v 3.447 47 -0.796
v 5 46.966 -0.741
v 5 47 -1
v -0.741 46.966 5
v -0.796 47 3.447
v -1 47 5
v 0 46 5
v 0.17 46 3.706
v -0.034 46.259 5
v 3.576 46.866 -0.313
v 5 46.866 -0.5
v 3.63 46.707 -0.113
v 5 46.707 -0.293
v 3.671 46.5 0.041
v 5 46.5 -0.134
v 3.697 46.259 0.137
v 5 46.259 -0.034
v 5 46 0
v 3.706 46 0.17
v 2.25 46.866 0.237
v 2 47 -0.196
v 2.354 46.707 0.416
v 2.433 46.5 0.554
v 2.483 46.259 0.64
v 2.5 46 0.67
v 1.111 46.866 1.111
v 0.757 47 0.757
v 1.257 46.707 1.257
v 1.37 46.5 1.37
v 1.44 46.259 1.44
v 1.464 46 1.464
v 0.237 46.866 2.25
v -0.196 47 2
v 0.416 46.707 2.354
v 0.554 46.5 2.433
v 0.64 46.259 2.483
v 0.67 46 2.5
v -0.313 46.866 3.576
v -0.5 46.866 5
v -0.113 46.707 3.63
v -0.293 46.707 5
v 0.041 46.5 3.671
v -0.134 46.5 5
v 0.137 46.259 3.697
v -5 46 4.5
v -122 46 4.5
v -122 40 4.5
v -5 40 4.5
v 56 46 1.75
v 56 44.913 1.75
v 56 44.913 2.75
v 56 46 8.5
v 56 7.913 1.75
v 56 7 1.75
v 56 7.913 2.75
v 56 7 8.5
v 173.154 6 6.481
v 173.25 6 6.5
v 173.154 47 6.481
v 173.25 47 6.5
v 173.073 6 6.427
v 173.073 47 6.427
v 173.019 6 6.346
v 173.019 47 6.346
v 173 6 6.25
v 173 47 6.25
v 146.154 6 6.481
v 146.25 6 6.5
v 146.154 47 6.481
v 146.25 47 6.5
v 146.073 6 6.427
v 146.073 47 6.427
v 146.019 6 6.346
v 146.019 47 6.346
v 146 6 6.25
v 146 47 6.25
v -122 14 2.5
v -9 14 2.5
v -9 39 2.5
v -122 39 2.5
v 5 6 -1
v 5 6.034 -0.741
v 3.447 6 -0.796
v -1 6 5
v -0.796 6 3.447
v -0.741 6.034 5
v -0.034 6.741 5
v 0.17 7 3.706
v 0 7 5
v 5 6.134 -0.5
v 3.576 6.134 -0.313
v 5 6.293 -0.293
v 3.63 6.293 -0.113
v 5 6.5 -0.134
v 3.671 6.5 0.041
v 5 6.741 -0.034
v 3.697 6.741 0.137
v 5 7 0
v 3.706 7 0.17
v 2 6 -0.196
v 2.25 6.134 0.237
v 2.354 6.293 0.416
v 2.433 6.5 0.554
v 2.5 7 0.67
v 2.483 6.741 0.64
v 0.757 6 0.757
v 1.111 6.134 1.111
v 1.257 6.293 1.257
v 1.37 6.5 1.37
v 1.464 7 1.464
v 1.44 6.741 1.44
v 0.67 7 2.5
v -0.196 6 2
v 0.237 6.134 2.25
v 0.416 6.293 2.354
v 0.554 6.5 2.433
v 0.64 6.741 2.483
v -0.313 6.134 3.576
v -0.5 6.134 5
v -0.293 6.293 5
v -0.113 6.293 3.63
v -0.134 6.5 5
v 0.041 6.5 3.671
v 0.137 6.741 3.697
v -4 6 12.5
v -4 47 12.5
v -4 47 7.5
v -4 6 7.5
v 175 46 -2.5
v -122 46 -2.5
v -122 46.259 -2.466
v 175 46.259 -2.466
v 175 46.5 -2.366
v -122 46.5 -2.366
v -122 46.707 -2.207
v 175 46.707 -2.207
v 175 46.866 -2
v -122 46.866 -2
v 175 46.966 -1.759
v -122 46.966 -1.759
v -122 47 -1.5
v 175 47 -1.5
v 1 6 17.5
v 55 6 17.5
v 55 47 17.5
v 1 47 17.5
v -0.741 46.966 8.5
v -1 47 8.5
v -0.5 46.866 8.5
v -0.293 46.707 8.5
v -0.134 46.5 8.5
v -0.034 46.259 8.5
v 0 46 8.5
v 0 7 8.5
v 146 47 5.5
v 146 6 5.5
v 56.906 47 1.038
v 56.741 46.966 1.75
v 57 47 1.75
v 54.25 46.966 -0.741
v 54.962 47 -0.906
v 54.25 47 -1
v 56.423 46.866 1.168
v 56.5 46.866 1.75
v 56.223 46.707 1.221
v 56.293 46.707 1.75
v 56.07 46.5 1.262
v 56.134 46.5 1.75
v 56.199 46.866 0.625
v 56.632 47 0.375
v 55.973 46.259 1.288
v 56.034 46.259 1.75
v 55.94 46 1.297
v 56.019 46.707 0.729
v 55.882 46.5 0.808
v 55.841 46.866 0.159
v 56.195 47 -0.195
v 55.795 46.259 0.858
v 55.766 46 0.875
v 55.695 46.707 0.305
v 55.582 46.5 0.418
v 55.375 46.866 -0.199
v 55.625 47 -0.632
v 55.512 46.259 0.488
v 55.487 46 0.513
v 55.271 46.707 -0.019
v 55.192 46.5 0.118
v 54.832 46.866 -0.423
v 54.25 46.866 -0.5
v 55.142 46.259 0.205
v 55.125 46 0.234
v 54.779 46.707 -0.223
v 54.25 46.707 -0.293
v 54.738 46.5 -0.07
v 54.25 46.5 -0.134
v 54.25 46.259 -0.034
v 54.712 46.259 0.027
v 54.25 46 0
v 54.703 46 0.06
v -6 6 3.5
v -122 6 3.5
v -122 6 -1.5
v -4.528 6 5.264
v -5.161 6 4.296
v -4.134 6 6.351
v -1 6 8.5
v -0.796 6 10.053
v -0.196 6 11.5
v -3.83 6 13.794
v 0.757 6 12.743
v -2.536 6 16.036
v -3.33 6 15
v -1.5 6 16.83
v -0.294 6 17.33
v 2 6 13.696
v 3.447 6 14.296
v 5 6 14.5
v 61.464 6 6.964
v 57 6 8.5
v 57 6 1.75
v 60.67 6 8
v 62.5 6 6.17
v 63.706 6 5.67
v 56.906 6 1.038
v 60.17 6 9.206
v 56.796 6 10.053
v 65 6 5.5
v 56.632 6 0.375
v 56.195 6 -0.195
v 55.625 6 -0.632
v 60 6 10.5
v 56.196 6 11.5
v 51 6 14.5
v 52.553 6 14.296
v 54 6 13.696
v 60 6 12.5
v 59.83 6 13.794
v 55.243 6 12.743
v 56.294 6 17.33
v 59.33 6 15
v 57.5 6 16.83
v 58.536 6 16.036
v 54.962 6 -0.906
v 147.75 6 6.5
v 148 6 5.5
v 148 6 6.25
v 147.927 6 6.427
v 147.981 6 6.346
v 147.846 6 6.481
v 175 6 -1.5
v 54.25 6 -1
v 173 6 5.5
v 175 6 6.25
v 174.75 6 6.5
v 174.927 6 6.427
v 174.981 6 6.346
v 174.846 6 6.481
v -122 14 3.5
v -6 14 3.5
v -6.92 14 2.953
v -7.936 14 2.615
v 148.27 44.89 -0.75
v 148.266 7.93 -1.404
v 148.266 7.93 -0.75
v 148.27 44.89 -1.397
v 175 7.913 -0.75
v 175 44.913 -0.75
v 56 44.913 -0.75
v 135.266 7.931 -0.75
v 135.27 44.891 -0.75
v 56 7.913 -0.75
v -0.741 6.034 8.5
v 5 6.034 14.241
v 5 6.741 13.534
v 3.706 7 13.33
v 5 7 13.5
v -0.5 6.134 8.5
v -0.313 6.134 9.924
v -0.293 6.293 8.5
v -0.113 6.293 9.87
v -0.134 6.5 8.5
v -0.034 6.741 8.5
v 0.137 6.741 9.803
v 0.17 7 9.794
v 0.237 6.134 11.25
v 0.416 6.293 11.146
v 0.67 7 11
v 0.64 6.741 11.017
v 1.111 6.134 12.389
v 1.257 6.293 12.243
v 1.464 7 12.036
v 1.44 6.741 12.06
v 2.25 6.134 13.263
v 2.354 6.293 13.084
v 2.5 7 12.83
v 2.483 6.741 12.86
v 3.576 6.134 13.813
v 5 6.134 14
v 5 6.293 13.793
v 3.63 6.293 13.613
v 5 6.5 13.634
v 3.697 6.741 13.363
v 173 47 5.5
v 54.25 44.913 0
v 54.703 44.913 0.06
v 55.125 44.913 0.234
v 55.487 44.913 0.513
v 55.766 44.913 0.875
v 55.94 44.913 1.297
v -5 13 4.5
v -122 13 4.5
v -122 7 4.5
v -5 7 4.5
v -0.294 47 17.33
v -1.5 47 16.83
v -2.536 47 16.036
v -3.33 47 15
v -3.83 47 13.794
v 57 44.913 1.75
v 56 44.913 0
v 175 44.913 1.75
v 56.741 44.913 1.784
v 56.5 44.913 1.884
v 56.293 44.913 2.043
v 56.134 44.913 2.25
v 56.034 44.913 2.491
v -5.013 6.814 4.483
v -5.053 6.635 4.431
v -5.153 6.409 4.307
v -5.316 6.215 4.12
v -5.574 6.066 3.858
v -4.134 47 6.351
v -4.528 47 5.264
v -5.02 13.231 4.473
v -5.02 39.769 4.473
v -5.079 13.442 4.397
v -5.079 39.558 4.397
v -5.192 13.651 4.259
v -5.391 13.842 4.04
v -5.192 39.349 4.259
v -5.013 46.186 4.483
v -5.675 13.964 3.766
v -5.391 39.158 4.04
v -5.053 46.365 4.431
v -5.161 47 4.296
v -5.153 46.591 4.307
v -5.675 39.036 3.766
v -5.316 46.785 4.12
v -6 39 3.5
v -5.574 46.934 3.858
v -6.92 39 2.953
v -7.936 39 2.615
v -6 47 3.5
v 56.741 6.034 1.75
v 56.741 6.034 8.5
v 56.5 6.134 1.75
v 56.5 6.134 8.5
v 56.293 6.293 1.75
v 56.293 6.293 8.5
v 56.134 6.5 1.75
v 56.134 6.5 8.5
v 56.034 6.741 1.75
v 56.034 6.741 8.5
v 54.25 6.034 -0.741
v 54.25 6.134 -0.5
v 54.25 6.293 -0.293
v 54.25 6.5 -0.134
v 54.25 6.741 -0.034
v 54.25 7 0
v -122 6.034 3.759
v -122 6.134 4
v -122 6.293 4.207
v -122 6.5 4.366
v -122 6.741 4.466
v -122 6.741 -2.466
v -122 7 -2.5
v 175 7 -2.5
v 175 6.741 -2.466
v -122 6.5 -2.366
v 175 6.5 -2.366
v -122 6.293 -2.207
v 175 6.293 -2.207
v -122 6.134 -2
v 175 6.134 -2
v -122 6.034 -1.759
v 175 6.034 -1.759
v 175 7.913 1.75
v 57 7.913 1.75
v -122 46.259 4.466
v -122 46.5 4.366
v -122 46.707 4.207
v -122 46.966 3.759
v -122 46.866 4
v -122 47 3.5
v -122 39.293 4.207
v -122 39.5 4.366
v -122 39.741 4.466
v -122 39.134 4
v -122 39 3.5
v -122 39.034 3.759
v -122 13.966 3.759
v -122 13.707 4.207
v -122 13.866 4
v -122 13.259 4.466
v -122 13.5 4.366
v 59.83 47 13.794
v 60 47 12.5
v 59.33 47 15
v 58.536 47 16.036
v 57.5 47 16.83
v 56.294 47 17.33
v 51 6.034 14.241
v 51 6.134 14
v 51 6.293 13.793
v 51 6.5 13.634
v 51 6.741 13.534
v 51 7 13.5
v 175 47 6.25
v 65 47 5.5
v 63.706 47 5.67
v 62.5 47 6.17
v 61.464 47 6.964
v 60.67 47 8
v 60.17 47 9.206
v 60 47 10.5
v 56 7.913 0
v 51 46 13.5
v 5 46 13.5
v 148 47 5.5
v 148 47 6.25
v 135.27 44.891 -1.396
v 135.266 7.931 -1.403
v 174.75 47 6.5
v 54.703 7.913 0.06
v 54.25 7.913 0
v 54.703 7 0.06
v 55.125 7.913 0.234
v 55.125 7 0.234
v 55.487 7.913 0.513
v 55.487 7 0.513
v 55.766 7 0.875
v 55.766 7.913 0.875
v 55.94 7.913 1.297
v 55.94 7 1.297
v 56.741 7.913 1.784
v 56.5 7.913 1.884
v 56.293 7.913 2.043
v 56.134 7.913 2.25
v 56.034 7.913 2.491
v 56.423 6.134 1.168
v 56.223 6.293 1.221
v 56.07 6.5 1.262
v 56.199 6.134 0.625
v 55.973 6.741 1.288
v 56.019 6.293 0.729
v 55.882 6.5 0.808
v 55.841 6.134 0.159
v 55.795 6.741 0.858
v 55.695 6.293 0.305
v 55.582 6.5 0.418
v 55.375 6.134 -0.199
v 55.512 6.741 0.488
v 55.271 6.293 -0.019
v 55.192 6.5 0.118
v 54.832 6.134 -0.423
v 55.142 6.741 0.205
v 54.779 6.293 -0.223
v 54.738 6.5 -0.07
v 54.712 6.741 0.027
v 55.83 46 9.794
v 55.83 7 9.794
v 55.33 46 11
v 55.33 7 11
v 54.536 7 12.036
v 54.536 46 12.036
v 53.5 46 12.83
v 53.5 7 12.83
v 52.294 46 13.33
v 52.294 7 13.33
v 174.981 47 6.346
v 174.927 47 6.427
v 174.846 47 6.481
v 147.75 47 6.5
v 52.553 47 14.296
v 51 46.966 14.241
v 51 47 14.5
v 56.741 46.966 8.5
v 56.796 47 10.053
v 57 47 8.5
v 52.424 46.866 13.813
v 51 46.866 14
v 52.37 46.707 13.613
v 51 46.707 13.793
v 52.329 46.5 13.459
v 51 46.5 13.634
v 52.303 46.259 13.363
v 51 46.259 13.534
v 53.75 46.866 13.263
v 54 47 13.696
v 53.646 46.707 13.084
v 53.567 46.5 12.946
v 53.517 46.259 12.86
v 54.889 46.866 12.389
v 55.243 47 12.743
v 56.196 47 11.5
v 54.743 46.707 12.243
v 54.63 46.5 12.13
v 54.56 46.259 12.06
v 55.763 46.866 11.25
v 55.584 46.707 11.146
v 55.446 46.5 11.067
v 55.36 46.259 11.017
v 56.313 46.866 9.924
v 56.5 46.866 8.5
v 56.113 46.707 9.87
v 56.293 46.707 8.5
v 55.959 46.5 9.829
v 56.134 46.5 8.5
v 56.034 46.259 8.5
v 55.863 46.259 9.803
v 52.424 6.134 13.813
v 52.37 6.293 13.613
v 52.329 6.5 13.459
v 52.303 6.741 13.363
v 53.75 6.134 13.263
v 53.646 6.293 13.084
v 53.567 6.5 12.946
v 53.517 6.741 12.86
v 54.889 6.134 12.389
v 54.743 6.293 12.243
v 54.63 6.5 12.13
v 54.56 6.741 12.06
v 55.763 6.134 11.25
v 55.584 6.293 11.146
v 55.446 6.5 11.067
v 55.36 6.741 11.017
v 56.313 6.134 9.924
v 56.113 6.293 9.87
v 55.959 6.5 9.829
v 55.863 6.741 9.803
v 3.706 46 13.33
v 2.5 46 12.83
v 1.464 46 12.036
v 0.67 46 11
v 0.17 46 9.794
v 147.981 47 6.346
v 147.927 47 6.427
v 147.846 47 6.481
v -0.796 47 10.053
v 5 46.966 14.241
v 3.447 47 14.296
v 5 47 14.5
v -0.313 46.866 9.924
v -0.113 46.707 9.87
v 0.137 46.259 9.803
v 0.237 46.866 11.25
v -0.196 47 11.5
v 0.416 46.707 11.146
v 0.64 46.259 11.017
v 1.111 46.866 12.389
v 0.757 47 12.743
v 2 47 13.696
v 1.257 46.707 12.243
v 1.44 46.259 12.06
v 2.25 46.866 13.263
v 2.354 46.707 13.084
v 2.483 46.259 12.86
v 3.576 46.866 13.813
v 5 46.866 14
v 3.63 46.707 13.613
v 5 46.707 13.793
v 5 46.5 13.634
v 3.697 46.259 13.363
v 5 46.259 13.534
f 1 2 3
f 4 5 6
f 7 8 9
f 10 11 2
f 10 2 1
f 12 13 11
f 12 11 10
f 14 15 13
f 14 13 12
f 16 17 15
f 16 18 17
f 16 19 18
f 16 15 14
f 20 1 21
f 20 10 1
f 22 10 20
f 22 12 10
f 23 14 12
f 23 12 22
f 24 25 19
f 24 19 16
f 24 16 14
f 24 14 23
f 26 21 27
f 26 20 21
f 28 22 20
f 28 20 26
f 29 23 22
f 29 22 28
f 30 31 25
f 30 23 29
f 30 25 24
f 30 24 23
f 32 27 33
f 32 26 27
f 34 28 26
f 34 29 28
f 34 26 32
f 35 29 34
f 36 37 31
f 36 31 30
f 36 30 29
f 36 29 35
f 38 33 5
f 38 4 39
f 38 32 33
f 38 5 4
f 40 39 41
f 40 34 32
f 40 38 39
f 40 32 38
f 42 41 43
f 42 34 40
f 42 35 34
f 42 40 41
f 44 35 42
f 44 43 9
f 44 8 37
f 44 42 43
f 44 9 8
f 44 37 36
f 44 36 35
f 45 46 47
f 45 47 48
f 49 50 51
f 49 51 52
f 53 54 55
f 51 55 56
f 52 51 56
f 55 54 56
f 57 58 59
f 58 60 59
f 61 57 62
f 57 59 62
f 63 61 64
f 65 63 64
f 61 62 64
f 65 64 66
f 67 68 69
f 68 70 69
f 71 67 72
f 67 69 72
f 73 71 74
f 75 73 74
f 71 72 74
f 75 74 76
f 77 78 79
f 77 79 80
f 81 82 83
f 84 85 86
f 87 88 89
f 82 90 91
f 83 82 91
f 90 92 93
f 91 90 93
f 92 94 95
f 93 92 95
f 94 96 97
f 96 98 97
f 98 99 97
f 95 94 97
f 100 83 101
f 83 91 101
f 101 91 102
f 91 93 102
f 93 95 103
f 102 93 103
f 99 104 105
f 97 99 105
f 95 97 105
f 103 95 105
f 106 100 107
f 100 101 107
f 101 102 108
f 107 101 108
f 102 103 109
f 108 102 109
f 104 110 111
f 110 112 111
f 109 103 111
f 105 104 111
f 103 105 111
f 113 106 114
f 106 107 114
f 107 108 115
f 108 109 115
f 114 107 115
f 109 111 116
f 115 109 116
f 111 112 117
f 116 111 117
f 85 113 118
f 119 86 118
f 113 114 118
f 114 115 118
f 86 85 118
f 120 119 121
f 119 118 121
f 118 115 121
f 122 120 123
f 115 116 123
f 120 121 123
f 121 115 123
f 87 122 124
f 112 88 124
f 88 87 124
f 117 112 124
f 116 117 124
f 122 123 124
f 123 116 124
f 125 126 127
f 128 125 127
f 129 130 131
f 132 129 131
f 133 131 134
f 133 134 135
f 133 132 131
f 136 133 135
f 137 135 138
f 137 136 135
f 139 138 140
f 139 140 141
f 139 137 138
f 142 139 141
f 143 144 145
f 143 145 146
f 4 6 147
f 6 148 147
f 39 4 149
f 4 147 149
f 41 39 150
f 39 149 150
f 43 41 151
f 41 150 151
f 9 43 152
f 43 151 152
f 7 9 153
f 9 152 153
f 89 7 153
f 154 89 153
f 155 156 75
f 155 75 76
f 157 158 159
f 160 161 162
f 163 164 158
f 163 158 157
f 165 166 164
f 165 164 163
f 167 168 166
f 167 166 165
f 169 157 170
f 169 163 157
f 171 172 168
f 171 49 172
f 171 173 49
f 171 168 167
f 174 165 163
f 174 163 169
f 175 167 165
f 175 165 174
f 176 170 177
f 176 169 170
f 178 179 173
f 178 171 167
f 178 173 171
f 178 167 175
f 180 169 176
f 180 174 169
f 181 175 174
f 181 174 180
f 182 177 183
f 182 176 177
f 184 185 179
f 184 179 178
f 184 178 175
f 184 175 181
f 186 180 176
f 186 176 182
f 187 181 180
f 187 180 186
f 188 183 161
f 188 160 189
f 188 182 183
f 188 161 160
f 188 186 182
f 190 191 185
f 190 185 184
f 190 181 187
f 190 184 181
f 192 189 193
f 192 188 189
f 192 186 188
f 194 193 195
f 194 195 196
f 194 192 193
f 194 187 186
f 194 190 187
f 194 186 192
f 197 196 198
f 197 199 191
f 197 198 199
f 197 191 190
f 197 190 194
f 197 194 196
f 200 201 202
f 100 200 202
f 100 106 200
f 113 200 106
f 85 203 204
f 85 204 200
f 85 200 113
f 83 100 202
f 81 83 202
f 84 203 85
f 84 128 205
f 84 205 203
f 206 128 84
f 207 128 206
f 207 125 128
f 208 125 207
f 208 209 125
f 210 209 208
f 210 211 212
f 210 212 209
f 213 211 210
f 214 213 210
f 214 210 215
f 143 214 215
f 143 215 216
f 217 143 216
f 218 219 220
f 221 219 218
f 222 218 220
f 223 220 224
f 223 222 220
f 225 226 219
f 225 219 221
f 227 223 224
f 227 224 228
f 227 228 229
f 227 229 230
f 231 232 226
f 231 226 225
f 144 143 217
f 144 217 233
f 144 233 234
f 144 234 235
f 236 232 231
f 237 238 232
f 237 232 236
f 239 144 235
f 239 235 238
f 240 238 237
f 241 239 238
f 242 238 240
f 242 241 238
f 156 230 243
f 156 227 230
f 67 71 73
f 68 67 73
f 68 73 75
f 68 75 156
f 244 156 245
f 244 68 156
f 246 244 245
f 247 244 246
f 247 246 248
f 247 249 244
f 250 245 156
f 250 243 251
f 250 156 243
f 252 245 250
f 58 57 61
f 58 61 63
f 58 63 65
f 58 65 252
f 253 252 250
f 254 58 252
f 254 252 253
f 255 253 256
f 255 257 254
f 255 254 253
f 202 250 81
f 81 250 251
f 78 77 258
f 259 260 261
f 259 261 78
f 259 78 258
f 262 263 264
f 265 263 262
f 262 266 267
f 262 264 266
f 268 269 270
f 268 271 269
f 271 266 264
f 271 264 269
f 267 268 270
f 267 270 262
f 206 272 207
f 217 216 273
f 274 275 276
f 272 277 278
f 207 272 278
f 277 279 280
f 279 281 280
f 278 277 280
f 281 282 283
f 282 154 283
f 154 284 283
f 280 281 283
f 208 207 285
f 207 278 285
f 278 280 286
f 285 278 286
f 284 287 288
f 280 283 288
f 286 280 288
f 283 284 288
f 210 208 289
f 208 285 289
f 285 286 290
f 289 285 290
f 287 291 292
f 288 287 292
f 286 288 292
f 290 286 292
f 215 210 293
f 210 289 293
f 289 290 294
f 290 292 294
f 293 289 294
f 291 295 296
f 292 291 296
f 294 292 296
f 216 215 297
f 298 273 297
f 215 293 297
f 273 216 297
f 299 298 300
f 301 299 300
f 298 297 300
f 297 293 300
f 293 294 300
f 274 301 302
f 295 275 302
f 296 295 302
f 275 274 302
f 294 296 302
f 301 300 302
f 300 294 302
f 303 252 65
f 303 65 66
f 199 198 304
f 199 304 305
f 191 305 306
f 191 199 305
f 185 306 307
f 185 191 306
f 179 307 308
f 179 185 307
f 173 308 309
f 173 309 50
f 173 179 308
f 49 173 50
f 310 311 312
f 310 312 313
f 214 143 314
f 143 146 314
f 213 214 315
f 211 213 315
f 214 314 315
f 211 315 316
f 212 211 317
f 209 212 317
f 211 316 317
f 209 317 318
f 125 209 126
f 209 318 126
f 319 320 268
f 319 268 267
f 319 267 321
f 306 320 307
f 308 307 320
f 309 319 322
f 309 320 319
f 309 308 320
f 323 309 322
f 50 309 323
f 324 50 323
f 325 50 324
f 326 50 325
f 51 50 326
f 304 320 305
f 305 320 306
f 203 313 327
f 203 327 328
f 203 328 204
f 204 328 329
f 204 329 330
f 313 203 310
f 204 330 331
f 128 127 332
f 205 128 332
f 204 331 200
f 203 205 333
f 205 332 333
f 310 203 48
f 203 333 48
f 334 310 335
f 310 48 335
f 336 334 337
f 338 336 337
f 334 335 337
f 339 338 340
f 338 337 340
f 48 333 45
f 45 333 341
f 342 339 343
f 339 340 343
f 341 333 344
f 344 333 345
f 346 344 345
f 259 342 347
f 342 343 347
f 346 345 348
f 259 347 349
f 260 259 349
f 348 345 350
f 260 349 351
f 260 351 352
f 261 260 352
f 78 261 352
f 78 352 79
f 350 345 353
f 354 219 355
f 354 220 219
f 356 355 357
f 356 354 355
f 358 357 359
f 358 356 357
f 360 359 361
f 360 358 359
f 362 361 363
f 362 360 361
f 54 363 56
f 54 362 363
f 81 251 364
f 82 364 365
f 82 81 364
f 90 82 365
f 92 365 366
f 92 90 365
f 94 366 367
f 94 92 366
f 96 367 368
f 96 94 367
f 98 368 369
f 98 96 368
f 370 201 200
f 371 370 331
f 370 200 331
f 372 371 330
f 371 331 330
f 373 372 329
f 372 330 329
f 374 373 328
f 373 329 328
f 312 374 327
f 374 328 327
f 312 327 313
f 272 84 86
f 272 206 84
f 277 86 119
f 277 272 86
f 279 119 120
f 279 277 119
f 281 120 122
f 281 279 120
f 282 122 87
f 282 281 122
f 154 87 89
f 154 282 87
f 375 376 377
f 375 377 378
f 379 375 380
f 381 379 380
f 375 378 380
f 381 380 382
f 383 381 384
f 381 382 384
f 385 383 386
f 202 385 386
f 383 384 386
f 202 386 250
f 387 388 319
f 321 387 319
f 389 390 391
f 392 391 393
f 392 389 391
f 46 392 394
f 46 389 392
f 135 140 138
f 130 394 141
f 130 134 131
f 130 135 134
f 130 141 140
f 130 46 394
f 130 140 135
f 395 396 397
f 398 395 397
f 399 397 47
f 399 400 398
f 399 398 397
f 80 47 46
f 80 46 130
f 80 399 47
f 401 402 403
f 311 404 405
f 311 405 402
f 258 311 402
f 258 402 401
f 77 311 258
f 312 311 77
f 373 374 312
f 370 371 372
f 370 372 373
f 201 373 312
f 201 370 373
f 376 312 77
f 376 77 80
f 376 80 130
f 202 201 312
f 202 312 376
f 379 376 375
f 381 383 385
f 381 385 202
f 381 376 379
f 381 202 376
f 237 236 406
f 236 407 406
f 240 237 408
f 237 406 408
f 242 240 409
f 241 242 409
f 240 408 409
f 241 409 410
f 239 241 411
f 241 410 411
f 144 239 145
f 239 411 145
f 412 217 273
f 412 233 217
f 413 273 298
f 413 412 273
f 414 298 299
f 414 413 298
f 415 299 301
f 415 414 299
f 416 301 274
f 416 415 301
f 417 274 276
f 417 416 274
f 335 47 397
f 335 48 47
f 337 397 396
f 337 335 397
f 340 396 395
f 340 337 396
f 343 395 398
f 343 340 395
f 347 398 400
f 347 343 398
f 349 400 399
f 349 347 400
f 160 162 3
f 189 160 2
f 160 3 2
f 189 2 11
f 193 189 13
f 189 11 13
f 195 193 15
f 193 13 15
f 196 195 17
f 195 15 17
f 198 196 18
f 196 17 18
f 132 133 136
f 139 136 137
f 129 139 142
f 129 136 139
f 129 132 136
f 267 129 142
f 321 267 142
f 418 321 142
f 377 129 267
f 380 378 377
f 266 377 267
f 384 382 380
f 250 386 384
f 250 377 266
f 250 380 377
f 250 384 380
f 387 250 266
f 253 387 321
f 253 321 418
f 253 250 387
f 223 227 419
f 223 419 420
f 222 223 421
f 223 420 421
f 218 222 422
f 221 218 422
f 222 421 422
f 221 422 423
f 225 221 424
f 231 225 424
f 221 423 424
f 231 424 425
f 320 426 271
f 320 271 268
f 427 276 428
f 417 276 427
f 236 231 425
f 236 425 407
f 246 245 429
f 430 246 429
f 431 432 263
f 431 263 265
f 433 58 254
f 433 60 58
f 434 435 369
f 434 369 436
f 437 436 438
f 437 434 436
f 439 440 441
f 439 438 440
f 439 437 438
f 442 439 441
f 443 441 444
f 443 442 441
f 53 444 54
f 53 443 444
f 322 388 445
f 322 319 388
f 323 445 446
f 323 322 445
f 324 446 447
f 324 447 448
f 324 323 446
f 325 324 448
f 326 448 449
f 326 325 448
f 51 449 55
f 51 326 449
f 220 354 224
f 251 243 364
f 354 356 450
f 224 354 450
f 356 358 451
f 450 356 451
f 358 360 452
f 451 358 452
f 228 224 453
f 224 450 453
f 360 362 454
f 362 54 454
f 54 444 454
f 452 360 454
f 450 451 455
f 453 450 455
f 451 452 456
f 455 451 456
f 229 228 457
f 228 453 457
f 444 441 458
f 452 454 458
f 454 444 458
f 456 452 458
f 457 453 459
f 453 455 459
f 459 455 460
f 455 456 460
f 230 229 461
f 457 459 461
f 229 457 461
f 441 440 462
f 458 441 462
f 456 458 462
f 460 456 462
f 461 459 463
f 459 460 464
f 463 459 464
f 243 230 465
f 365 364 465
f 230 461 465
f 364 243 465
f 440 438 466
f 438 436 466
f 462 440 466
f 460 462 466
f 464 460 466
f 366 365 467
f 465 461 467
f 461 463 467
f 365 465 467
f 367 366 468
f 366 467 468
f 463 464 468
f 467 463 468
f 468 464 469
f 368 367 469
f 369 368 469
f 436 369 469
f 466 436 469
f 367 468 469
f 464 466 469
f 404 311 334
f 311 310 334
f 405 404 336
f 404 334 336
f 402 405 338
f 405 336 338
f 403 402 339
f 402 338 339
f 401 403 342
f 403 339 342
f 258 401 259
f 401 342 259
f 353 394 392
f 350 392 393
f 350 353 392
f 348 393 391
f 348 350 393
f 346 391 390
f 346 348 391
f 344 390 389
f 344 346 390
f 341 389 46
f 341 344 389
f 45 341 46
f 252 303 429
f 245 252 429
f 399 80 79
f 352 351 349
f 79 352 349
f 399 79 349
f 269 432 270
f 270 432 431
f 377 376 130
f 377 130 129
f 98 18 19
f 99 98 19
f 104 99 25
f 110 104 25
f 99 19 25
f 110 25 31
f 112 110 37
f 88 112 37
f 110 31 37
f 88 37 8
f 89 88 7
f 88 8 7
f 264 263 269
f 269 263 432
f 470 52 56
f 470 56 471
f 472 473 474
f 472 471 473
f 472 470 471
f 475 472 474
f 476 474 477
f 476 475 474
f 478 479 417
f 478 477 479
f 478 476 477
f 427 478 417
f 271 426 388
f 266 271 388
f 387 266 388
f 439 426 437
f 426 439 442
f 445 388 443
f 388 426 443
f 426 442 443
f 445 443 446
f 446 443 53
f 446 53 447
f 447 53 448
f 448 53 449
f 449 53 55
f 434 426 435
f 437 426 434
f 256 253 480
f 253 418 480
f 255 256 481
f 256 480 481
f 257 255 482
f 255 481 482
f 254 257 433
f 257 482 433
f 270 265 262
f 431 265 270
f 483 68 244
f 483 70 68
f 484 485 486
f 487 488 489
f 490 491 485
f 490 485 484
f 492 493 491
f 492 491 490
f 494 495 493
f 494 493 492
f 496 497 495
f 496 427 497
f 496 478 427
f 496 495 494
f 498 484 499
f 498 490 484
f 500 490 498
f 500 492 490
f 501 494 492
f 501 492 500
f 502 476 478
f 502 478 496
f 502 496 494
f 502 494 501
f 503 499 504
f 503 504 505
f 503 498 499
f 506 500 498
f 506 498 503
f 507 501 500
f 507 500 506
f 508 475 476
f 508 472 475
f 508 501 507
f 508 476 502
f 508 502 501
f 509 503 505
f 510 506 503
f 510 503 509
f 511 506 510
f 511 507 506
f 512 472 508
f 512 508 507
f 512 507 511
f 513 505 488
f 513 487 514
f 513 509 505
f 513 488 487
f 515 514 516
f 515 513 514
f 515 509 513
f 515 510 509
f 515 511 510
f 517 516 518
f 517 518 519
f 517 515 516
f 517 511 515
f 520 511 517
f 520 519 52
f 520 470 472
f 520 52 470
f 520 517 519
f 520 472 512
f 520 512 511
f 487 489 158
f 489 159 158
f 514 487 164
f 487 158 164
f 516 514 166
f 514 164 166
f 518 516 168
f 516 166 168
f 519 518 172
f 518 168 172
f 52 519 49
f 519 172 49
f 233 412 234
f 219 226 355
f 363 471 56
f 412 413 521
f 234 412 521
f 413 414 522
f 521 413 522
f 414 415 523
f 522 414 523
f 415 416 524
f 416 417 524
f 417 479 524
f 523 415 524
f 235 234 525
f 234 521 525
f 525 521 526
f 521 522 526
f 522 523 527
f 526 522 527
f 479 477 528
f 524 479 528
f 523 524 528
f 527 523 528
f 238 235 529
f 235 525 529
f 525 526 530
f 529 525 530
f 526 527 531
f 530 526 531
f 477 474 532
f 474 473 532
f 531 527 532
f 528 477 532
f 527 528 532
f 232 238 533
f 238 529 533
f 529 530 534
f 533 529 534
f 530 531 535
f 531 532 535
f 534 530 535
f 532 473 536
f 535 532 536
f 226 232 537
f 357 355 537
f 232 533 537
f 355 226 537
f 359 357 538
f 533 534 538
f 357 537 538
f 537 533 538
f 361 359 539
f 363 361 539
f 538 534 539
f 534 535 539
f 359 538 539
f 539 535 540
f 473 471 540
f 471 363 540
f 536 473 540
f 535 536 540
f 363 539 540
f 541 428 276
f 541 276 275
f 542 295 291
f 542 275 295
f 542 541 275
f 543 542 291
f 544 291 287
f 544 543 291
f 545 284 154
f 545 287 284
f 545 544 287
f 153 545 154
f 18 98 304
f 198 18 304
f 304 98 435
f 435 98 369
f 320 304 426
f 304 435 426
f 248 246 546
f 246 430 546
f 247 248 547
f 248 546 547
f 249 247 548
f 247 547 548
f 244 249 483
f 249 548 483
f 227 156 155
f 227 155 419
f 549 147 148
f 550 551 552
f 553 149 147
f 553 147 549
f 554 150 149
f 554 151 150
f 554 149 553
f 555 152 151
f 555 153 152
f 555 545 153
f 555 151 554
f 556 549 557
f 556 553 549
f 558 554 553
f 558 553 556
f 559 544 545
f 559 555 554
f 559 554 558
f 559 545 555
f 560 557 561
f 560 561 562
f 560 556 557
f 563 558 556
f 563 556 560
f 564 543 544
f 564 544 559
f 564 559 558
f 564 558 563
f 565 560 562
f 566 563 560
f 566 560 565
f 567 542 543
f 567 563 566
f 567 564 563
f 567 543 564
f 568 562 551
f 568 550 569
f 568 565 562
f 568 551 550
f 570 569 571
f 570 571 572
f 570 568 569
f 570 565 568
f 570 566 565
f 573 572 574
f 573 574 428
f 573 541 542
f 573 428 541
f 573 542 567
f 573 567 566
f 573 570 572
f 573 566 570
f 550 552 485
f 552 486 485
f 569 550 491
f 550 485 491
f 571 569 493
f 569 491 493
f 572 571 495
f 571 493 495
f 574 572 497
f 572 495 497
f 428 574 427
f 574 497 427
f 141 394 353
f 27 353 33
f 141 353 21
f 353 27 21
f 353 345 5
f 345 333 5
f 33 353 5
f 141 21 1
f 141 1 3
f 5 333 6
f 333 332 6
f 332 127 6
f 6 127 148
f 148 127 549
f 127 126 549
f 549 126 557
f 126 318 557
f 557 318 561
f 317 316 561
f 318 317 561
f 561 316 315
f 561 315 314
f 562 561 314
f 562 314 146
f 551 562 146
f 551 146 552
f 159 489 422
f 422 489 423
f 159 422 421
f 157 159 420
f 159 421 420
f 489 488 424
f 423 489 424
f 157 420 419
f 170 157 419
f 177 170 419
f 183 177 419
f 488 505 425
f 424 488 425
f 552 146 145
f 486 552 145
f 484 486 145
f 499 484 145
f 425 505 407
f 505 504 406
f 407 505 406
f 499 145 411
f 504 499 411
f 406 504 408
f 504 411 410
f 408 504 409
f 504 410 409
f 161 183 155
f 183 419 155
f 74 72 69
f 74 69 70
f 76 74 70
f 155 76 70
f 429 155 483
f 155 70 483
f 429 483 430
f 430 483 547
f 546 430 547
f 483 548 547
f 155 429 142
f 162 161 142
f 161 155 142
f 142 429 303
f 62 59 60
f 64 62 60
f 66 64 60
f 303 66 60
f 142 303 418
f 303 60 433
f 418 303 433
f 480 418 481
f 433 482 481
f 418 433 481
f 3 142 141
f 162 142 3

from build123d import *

# Parameters (mm, degrees)
SKETCH037_W                               = 2
SKETCH037_H                               = 41
EXTRUDE036_DEPTH                          = 1
SKETCH032_AS_DRAWN_W                      = 36.96
SKETCH032_AS_DRAWN_H                      = 13
EXTRUDE030_DEPTH                          = 2
EXTRUDE030_ONTO_SKETCH032_ROLL_ANGLE      = 0.005477
EXTRUDE030_ONTO_SKETCH032_PITCH_ANGLE     = -0.011215
EXTRUDE030_ONTO_SKETCH032_PLACEMENT_ANGLE = 89.994139
SKETCH031_W                               = 37
SKETCH031_H                               = 2.5
EXTRUDE029_DEPTH                          = 120
SKETCH030_W                               = 56
SKETCH030_H                               = 13.5
EXTRUDE028_DEPTH                          = 41
FILLET009_R                               = 5
FILLET010_R                               = 1.75
SKETCH036_W                               = 120
SKETCH036_H                               = 8
EXTRUDE035_DEPTH                          = 2
FILLET011_R                               = 1
FILLET012_R                               = 1
FILLET013_R                               = 0.25
FILLET014_R                               = 1


with BuildPart() as velcroborder:
    # Sketch037 → Extrude036 (new body)
    with BuildSketch(Plane.XY.offset(5.5)):
        with Locations((174, 26.5)):
            Rectangle(SKETCH037_W, SKETCH037_H)
        with Locations((147, 26.5)):
            Rectangle(SKETCH037_W, SKETCH037_H)
    extrude(amount=EXTRUDE036_DEPTH)


with BuildPart() as sensorcuts:
    # Sketch032 as drawn → Extrude030 (new)
    with BuildSketch(Plane.XY):
        with Locations((-0.07, -91)):
            Rectangle(SKETCH032_AS_DRAWN_W, SKETCH032_AS_DRAWN_H)
    extrude(amount=EXTRUDE030_DEPTH)


with BuildPart() as sensorcuts_1:
    # Extrude030 onto Sketch032 roll: moved
    add(sensorcuts.part.rotate(Axis((0, 0, 0), (1, 0, 0)), EXTRUDE030_ONTO_SKETCH032_ROLL_ANGLE))


with BuildPart() as sensorcuts_2:
    # Extrude030 onto Sketch032 pitch: moved
    add(sensorcuts_1.part.rotate(Axis((0, 0, 0), (0, 1, 0)), EXTRUDE030_ONTO_SKETCH032_PITCH_ANGLE))


with BuildPart() as sensorcuts_3:
    # Extrude030 onto Sketch032 placement: moved
    add(sensorcuts_2.part.moved(Location((50.768112, 26.489725, 2.608705))).rotate(Axis((50.768112, 26.489725, 2.608705), (0, 0, 1)), EXTRUDE030_ONTO_SKETCH032_PLACEMENT_ANGLE))


with BuildPart() as sensorcuts_4:
    # Extrude030 placement: moved
    add(sensorcuts_3.part.moved(Location((0, 0, -4))))


with BuildPart() as extrude029:
    # Sketch031 → Extrude029 (new body)
    with BuildSketch(Plane.YZ.offset(56)):
        with Locations((26.412533, 0.5)):
            Rectangle(SKETCH031_W, SKETCH031_H)
    extrude(amount=EXTRUDE029_DEPTH)


with BuildPart() as band003:
    # Sketch030 → Extrude028 (new body)
    with BuildSketch(Plane.XZ.offset(-6)):
        Polygon((175, 5.5), (60, 5.5), (60, 17.5), (-4, 17.5), (-4, 2.5), (-122, 2.5), (-122, -2.5), (175, -2.5), align=None)
        with Locations((28, 6.75)):
            Rectangle(SKETCH030_W, SKETCH030_H, mode=Mode.SUBTRACT)
    extrude(amount=-EXTRUDE028_DEPTH)

    # Cut002: cut Extrude029
    add(extrude029.part, mode=Mode.SUBTRACT)

    # Cut003: cut sensorCuts
    add(sensorcuts_4.part, mode=Mode.SUBTRACT)

    # Fillet009
    fillet009_edges = [band003.edges().sort_by_distance(p)[0] for p in [
        (60, 26.5, 5.5),
        (60, 26.5, 17.5),
        (-4, 26.5, 17.5),
        (-4, 26.5, 2.5),
        (0, 26.5, 0),
        (0, 26.5, 13.5),
        (56, 26.5, 13.5),
    ]]
    fillet(fillet009_edges, radius=FILLET009_R)

    # Fillet010
    fillet010_edges = [band003.edges().sort_by_distance(p)[0] for p in [
        (56, 6.956266, 0),
        (56, 45.956266, 0),
    ]]
    fillet(fillet010_edges, radius=FILLET010_R)


with BuildPart() as fillet014:
    # Sketch036 → Extrude035 (new body)
    with BuildSketch(Plane.XY.offset(2.5)):
        with Locations((-62, 43)):
            Rectangle(SKETCH036_W, SKETCH036_H)
        with Locations((-62, 10)):
            Rectangle(SKETCH036_W, SKETCH036_H)
    extrude(amount=EXTRUDE035_DEPTH)

    # Fusion011: union velcroBorder, band003
    add(velcroborder.part)
    add(band003.part)

    # Fillet011
    fillet011_edges = [fillet014.edges().sort_by_distance(p)[0] for p in [
        (56, 26.412533, 1.75),
    ]]
    fillet(fillet011_edges, radius=FILLET011_R)

    # Fillet012
    fillet012_edges = [fillet014.edges().sort_by_distance(p)[0] for p in [
        (26.5, 6, -2.5),
        (26.5, 47, -2.5),
        (-63.5, 6, 4.5),
        (-63.5, 47, 4.5),
        (-63.5, 39, 4.5),
        (-63.5, 14, 4.5),
    ]]
    fillet(fillet012_edges, radius=FILLET012_R)

    # Fillet013
    fillet013_edges = [fillet014.edges().sort_by_distance(p)[0] for p in [
        (175, 26.5, 6.5),
        (173, 26.5, 6.5),
        (148, 26.5, 6.5),
        (146, 26.5, 6.5),
    ]]
    fillet(fillet013_edges, radius=FILLET013_R)

    # Fillet014
    fillet014_edges = [fillet014.edges().sort_by_distance(p)[0] for p in [
        (28, 6, 13.5),
        (28, 47, 13.5),
    ]]
    fillet(fillet014_edges, radius=FILLET014_R)


solid = fillet014.part
